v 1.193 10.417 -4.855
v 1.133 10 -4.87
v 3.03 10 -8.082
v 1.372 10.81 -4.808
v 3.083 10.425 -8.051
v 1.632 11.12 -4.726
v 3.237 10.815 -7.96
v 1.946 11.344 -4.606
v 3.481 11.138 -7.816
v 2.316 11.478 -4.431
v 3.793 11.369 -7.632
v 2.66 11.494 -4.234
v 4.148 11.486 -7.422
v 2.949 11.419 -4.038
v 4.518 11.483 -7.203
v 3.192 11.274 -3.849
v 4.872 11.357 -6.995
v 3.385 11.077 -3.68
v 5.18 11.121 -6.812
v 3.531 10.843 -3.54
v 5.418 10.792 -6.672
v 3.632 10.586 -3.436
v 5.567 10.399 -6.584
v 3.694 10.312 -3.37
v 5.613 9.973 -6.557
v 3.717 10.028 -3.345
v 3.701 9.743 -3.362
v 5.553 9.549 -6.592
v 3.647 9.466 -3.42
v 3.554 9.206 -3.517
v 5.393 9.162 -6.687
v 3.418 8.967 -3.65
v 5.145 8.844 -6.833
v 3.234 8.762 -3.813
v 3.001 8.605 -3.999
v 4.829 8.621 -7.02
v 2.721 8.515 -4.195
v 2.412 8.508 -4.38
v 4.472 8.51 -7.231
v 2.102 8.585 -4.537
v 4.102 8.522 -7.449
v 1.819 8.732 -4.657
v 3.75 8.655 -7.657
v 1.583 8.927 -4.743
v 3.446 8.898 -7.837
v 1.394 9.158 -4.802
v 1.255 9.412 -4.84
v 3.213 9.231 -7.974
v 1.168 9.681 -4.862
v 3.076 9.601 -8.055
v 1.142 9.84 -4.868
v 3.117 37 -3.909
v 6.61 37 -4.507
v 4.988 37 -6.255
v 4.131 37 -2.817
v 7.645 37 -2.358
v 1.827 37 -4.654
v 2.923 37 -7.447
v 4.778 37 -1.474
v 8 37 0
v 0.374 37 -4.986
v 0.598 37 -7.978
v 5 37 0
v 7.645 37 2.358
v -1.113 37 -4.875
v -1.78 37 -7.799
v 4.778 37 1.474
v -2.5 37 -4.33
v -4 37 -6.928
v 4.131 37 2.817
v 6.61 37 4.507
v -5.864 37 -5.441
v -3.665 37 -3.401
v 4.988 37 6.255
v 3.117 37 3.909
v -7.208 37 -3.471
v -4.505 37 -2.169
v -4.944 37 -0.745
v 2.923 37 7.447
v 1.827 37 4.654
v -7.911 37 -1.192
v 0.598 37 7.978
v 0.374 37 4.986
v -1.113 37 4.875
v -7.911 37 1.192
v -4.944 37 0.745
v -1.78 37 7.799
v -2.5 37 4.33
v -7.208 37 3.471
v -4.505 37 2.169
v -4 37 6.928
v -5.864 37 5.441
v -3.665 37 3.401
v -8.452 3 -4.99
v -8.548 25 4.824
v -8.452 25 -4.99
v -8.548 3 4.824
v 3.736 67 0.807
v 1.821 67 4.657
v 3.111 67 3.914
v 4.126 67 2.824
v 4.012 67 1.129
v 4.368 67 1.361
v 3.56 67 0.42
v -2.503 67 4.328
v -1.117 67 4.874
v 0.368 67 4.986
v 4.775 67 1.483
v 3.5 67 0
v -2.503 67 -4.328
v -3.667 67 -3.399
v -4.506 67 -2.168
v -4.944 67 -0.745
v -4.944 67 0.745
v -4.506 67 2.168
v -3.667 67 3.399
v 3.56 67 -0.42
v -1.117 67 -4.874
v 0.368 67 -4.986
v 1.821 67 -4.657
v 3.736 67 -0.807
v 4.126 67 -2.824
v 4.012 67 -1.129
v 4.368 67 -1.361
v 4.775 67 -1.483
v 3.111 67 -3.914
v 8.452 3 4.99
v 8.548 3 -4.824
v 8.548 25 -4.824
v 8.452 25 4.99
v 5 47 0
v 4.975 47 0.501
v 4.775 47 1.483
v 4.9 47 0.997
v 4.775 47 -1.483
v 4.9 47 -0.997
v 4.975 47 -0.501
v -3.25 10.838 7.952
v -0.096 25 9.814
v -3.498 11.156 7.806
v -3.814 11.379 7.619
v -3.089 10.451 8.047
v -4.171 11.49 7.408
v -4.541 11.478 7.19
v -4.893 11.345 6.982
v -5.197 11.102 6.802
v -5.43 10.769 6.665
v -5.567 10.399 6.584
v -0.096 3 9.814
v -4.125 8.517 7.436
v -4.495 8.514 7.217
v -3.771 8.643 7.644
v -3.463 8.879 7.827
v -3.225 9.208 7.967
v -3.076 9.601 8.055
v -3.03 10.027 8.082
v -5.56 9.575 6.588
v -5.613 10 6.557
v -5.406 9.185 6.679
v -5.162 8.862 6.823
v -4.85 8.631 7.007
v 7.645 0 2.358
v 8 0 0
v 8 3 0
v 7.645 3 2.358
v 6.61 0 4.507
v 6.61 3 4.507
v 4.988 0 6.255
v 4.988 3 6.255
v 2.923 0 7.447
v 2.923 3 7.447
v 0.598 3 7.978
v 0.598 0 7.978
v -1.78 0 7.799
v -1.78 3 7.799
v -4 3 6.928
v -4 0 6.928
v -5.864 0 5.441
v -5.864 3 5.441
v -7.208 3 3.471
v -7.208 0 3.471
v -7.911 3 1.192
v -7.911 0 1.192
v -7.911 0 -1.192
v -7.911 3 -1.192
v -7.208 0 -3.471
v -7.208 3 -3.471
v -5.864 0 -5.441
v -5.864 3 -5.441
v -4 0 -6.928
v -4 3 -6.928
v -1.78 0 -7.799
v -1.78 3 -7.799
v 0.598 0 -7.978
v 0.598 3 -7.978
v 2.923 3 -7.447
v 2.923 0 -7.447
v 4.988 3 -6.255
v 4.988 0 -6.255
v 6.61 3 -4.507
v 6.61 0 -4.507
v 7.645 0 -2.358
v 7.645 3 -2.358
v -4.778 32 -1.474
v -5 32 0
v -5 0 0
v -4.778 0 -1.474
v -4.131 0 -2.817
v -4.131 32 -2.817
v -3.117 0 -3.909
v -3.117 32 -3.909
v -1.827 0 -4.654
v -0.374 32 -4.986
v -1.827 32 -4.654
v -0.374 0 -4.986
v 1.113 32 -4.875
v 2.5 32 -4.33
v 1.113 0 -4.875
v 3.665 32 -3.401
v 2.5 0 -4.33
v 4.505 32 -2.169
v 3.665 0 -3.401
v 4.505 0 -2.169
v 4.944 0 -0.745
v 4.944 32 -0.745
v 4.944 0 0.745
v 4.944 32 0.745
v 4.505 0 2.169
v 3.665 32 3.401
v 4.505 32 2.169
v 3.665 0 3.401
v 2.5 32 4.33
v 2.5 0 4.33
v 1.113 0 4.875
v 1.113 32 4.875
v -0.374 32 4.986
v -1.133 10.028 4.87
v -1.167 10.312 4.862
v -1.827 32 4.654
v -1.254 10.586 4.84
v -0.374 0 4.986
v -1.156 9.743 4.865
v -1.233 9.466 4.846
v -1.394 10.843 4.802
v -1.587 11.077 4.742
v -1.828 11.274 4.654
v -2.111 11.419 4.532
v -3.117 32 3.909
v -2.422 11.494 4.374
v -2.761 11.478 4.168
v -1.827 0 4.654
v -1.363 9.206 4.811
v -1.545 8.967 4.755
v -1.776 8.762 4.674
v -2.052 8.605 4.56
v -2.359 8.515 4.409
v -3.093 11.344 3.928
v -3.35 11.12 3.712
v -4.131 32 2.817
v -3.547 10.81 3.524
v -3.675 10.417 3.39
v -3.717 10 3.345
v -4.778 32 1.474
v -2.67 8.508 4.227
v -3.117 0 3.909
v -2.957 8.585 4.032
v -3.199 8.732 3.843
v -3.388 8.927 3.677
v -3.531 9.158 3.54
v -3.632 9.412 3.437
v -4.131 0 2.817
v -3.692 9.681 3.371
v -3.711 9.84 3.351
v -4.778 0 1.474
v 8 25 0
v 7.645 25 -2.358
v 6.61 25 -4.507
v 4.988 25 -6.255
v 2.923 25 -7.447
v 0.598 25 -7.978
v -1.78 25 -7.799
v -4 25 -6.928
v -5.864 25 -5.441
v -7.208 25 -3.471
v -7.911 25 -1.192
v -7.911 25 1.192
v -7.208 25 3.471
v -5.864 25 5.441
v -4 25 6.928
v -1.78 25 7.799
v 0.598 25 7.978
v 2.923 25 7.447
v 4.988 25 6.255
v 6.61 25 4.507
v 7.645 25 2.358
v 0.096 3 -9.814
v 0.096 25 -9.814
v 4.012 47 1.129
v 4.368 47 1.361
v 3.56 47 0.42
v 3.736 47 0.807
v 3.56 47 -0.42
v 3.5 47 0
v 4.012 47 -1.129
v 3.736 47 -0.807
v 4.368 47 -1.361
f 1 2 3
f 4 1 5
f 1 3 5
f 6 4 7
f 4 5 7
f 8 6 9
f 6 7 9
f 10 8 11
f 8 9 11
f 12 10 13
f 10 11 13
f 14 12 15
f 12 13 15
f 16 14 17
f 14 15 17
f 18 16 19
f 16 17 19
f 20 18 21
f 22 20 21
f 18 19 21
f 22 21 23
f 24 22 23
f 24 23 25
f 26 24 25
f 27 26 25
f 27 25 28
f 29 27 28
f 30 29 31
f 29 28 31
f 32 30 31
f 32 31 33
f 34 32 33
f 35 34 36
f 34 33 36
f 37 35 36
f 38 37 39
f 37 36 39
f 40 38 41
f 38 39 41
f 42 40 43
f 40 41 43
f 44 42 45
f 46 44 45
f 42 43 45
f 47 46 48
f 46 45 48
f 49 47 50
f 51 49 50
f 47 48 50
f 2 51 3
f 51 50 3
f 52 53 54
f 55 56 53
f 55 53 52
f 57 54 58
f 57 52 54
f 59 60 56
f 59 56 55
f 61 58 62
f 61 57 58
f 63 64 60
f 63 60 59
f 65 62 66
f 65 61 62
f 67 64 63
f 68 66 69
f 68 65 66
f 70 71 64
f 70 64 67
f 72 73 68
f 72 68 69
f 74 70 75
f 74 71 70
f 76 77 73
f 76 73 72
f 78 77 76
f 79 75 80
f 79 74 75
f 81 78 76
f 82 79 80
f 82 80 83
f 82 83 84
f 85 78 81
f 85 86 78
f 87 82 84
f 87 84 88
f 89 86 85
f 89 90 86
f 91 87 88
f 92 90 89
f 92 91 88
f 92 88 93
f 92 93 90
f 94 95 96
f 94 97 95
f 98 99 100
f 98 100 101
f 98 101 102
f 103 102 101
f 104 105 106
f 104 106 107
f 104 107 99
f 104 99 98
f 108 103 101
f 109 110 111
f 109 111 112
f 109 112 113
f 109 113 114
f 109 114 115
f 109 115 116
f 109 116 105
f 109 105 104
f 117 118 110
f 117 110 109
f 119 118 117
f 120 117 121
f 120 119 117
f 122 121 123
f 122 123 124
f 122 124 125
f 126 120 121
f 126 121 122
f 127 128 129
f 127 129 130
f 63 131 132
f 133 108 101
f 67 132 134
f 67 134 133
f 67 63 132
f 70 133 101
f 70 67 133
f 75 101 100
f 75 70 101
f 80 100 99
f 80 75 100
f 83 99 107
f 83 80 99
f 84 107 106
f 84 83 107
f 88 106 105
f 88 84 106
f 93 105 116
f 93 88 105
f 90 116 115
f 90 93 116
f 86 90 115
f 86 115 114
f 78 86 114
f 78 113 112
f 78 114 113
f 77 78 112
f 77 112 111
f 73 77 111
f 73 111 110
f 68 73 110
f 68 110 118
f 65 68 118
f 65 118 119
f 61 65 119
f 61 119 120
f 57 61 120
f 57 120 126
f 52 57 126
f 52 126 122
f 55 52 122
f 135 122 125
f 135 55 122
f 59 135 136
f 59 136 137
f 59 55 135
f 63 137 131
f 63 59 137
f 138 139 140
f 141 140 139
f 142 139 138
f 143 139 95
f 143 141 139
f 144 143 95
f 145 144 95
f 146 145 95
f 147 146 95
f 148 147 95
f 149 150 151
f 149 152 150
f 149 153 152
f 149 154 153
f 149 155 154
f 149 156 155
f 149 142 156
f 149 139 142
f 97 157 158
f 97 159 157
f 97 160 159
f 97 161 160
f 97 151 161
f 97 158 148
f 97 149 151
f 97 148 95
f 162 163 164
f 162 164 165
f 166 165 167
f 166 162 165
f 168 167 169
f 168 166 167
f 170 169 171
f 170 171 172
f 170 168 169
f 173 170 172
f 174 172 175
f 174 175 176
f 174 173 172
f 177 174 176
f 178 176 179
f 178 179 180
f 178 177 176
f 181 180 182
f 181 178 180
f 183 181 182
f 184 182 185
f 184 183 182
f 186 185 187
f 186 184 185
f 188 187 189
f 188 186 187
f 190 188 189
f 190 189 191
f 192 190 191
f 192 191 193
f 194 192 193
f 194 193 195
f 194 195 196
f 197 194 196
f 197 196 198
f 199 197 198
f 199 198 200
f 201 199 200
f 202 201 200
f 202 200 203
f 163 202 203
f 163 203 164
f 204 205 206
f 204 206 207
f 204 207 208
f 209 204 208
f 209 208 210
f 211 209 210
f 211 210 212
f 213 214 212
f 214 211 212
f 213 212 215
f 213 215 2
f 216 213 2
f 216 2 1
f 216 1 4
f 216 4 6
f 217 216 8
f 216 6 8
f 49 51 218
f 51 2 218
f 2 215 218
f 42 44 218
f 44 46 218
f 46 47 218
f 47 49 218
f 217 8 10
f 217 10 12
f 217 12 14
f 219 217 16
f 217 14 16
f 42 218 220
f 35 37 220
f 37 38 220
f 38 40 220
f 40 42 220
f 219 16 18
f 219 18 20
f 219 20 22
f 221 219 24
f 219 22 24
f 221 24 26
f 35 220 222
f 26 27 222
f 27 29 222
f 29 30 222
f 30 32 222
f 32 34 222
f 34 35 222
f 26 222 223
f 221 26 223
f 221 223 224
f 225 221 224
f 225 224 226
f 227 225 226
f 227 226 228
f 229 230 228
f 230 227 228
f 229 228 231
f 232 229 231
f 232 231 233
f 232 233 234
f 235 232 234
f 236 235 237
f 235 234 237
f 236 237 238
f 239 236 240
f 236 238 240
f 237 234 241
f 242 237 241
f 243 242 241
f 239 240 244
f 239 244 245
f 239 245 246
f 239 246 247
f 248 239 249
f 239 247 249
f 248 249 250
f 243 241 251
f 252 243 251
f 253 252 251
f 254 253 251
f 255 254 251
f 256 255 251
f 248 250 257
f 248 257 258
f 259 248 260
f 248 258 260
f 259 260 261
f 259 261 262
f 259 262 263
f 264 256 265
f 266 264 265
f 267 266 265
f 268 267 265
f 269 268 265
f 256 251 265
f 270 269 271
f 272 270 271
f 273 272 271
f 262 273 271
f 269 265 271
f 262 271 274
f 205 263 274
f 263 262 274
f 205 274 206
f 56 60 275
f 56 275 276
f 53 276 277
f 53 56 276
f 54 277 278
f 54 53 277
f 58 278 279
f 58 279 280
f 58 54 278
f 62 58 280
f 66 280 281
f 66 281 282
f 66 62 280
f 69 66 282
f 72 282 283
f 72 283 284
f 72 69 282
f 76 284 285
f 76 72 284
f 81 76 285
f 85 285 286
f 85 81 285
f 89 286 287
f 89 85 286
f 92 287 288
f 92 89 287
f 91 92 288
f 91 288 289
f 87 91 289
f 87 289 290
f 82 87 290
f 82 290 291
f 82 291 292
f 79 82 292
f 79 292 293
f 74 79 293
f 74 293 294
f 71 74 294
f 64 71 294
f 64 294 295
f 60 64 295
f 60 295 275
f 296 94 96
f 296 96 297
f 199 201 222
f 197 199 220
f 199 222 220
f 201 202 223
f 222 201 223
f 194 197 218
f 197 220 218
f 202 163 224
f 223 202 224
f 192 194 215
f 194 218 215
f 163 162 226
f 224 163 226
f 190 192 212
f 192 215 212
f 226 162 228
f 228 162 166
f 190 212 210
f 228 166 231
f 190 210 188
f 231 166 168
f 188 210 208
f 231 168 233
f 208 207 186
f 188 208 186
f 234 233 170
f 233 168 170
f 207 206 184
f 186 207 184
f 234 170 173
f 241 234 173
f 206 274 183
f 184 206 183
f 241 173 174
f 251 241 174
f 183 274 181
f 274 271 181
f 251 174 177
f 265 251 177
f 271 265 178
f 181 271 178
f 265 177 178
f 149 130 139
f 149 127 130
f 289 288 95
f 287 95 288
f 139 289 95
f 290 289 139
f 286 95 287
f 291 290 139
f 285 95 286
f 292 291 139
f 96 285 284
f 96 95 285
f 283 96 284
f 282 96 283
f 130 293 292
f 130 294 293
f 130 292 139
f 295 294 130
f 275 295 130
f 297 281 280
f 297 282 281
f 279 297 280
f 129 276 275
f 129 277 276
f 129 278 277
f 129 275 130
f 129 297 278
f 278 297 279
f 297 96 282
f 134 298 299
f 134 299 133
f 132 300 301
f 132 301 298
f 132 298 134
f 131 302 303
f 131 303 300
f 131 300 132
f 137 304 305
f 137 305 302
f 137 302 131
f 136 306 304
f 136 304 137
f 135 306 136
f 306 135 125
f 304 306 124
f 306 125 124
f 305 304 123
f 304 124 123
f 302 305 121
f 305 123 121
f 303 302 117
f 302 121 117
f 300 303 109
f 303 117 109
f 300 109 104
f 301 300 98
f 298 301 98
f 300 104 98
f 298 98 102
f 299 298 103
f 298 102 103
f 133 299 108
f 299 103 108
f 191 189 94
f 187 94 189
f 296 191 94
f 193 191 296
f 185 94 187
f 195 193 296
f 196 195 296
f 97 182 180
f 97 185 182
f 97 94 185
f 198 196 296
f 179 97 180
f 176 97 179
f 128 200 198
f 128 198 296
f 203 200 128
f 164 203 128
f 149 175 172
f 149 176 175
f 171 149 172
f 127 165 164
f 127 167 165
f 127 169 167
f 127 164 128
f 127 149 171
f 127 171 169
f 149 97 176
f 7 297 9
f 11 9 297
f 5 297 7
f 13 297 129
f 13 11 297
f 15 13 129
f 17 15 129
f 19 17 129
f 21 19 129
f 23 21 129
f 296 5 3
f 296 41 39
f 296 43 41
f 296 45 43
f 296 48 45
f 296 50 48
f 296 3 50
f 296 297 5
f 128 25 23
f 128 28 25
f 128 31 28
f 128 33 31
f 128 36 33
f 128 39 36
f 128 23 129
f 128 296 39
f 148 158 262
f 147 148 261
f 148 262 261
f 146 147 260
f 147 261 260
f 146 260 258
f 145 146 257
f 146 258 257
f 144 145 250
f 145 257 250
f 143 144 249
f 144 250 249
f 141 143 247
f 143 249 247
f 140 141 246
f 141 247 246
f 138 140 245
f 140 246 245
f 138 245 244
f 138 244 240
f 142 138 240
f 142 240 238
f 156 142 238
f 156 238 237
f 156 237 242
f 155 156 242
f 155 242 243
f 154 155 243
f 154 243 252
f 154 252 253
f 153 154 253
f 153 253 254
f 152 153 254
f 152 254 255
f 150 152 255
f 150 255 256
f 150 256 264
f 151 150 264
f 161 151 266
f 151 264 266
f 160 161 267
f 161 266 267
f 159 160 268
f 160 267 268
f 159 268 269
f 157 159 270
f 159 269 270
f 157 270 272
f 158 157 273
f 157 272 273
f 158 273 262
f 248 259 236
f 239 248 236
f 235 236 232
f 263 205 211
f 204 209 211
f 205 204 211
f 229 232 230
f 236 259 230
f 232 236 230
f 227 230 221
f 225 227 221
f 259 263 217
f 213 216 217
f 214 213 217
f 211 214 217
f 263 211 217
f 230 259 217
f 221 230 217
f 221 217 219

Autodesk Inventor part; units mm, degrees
ref_plane "YZ Plane" through (0, 0, 0) normal (1, 0, 0) x (0, 1, 0)
ref_plane "XZ Plane" through (0, 0, 0) normal (0, 1, 0) x (-1, 0, 0)
ref_plane "XY Plane" through (0, 0, 0) normal (0, 0, 1) x (1, 0, 0)
sketch "Sketch1" plane through (0, 0, 0) normal (0, 1, 0) x (-1, 0, 0)
  line L0 (8.5475, 4.8243) -> (8.4517, -4.9902)
  line L1 (8.4517, -4.9902) -> (-0.0957, -9.8145)
  line L2 (-0.0957, -9.8145) -> (-8.5475, -4.8243)
  line L3 (-8.5475, -4.8243) -> (-8.4517, 4.9902)
  line L4 (-8.4517, 4.9902) -> (0.0957, 9.8145)
  line L5 (0.0957, 9.8145) -> (8.5475, 4.8243)
  circle A0 centre (0, 0) radius 5
  dimension "d0" = 17
  dimension "d1" = 10
extrude "Extrusion1" add sketch "Sketch1" along normal blind 37
sketch "Sketch2" plane through (0, 37, 0) normal (0, 1, 0) x (1, 0, 0)
  circle A0 centre (0, 0) radius 8
  circle A1 centre (0, 0) radius 13
  circle A2 centre (0, 0) radius 5
  dimension "d4" = 16
  dimension "d5" = 5
extrude "Extrusion2" cut sketch "Sketch2" against normal blind 12 contours A1
sketch "Sketch3" plane through (0, 0, 0) normal (0, -1, 0) x (1, 0, 0)
  circle A0 centre (0, 0) radius 8
  circle A1 centre (0, 0) radius 13
  dimension "d9" = 16
  dimension "d10" = 5
extrude "Extrusion3" cut sketch "Sketch3" against normal blind 3
sketch "Sketch9" plane through (0.0957, 3, -9.8145) normal (0.5084, 0, -0.8611) x (-0.8611, 0, -0.5084)
  circle A0 centre (-4.9075, 7) radius 1.5
  line L0 (-9.815, 0) -> (-9.815, 22) projected
  line L1 (0, 0) -> (0, 22) projected
  point P0 (-4.9075, -3)
  dimension "d31" = 3
  dimension "d32" = 9.8149
  dimension "d33" = 4.9075
  dimension "d34" = 10
extrude "Extrusion5" cut sketch "Sketch9" against normal through all
extrude "Extrusion6" add sketch "Sketch2" along normal blind 30 and the other way blind 5 contours A2
sketch "Sketch10" plane through (0, 67, 0) normal (0, 1, 0) x (1, 0, 0)
  circle A0 centre (0, 0) radius 5 projected
  circle A1 centre (5, 0) radius 1.5
  dimension "d45" = 3
extrude "Extrusion7" cut sketch "Sketch10" against normal blind 20 contours A0 A1 | A0 A1 picked at (4.5056, -0.2843) picked at (5.4323, -0.4031)
equation "\"d33\" = 0.5 * d32"
properties part number "AnyaKicsi"
